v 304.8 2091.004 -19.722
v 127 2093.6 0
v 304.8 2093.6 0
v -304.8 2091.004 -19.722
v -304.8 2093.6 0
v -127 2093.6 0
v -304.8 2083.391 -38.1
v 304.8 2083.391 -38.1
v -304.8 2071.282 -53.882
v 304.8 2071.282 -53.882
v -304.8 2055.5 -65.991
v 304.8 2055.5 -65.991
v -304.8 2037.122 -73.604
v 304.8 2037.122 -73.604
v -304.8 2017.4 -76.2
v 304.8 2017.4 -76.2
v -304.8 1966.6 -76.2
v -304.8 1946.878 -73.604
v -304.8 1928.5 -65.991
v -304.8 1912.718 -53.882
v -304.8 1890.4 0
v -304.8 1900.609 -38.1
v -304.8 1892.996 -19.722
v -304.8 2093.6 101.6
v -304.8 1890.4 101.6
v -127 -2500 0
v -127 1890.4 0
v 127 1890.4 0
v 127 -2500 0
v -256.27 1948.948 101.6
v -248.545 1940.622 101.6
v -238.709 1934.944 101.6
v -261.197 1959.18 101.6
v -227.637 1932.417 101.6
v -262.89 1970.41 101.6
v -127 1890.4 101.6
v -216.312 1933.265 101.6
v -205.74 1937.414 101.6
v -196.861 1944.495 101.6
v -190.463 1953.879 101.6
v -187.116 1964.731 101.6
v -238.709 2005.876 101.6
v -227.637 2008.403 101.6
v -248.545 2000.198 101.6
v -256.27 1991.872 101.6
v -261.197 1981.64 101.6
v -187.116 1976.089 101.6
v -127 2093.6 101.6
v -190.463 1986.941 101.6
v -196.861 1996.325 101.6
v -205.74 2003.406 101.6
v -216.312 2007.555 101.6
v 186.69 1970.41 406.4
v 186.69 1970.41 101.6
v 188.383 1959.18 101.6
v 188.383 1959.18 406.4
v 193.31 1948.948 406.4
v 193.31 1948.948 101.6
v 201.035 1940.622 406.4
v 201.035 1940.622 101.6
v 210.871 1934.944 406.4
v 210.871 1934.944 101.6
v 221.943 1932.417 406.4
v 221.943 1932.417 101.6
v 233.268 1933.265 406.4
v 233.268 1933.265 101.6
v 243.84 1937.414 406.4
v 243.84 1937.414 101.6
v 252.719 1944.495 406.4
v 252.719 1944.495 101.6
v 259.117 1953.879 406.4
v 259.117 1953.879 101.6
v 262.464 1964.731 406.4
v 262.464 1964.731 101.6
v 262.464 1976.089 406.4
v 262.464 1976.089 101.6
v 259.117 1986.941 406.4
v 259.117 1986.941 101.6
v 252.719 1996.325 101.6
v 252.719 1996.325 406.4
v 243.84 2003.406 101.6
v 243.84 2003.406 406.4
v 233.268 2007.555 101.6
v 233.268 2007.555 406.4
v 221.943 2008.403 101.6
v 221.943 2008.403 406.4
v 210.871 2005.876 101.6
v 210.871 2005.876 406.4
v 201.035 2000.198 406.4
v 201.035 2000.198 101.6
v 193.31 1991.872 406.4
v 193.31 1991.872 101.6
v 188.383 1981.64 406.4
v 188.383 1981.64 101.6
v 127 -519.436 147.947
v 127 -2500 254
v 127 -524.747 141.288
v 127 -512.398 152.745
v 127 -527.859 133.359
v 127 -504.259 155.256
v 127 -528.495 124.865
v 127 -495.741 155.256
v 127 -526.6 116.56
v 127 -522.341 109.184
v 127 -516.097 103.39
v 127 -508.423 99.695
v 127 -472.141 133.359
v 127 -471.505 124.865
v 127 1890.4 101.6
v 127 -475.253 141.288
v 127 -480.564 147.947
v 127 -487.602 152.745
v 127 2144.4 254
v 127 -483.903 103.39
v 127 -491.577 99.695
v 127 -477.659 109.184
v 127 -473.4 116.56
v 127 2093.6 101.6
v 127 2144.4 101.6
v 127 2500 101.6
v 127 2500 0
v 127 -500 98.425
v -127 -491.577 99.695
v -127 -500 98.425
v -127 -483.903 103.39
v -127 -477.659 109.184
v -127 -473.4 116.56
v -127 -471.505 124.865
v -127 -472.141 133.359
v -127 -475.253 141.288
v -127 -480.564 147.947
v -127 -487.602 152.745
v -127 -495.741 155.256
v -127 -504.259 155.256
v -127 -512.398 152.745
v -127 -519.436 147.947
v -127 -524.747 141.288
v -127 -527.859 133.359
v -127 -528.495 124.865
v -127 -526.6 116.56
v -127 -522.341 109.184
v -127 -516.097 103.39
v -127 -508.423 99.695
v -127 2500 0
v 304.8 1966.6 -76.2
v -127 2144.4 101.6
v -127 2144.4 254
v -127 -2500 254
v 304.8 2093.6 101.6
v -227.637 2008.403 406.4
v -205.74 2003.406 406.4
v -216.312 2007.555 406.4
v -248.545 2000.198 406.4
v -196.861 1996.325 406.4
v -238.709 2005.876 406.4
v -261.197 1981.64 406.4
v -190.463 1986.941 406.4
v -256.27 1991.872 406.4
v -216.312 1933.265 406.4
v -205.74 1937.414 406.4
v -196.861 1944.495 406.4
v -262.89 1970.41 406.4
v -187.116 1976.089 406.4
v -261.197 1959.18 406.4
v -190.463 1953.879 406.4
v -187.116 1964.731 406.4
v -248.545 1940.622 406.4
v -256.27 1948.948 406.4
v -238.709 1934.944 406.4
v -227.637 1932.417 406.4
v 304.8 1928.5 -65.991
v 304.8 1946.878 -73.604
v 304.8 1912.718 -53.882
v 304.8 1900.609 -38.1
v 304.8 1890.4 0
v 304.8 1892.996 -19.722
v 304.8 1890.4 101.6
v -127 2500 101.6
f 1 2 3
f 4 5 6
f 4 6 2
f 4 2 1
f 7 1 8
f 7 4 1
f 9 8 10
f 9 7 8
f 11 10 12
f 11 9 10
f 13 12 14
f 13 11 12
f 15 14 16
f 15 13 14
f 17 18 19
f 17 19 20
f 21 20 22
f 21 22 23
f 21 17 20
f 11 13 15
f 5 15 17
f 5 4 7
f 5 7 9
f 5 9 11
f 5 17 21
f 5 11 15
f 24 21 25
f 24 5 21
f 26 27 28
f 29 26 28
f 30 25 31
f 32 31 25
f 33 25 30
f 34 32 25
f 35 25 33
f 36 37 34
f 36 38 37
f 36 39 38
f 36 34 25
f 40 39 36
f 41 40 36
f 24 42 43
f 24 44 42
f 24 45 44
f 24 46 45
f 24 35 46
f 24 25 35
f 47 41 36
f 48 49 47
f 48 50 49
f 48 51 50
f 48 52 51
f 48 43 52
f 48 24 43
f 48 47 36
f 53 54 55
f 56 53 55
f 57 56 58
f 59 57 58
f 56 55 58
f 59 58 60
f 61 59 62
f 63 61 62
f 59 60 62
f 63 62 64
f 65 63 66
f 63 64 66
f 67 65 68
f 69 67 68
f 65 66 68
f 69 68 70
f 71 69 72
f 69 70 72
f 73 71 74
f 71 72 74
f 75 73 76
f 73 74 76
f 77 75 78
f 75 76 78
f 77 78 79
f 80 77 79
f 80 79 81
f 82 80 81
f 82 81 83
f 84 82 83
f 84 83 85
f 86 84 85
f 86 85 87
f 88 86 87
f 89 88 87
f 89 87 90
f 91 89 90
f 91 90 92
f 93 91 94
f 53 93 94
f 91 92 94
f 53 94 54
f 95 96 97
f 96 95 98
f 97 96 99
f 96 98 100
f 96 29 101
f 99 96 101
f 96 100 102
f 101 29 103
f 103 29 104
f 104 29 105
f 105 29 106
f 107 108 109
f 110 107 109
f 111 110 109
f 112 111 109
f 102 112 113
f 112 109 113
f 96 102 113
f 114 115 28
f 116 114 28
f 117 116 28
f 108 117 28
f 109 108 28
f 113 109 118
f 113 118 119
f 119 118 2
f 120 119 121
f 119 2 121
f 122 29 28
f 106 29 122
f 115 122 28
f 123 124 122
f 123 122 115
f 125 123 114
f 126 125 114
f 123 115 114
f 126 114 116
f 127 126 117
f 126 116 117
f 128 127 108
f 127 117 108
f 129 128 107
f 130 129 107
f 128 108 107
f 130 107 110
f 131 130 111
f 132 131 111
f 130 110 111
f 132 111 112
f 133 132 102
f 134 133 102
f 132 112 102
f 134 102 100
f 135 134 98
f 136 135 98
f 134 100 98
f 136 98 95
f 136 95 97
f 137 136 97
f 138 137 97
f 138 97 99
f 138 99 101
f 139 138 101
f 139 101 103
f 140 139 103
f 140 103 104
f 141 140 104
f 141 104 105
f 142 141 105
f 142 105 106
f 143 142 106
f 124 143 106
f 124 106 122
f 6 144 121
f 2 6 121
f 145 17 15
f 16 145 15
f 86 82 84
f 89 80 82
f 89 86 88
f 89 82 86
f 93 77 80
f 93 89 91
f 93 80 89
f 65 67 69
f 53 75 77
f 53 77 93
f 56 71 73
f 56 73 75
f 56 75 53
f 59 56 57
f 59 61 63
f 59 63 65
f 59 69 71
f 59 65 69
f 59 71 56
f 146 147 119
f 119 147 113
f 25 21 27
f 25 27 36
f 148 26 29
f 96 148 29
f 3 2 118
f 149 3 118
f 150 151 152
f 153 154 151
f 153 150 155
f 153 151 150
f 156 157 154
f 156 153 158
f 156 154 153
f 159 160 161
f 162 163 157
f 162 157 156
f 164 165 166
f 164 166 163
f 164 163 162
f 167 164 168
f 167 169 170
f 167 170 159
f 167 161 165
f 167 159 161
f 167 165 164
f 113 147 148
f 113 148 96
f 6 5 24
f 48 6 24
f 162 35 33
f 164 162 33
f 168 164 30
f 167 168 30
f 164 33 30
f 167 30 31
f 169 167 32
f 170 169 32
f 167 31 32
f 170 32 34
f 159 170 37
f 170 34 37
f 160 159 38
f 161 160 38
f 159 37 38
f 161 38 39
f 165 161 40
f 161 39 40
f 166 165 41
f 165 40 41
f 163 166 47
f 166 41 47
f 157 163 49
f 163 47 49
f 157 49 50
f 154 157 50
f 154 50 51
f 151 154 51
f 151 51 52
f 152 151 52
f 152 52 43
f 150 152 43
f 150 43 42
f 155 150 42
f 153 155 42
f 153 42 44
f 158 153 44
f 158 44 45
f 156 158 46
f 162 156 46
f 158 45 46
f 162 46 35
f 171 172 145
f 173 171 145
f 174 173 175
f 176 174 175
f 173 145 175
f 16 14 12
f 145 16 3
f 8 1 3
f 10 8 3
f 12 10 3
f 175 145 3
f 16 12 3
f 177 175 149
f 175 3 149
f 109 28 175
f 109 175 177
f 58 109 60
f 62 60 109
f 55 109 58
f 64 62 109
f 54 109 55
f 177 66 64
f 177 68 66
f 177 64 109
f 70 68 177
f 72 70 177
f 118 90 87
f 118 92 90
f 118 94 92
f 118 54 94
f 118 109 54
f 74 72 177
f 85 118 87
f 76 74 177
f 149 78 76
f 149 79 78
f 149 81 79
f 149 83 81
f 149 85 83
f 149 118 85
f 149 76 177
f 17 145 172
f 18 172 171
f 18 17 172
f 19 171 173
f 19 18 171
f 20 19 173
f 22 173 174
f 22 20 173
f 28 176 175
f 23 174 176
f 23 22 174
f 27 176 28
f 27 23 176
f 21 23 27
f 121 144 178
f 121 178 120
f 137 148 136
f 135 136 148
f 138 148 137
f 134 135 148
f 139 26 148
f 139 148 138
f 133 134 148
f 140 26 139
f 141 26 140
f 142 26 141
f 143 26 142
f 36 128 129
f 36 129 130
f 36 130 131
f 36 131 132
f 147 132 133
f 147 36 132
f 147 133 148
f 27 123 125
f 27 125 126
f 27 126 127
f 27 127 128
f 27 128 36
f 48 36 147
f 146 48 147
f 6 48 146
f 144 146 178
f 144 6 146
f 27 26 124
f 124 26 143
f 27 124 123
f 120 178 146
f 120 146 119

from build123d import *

# Parameters (mm, degrees)
SKETCH1_W           = 254
SKETCH1_H           = 5000
BOSS_EXTRUDE1_DEPTH = 254
SKETCH2_R           = 28.575
CUT_EXTRUDE1_DEPTH  = 2526.674563359
SKETCH4_W           = 254
SKETCH4_H           = 355.6
CUT_EXTRUDE2_DEPTH  = 152.4
BOSS_EXTRUDE2_START = -152.4
SKETCH5_W           = 609.6
SKETCH5_H           = 203.2
BOSS_EXTRUDE2_DEPTH = 101.6
SKETCH8_W           = 76.2
SKETCH8_H           = 203.2
BOSS_EXTRUDE3_DEPTH = 609.6
FILLET1_START       = -304.8
FILLET1_DEPTH       = 609.6
SKETCH9_R           = 38.1
BOSS_EXTRUDE4_DEPTH = 304.8


with BuildPart() as part:
    # Sketch1 → Boss-Extrude1 (new body)
    with BuildSketch(Plane.XY):
        Rectangle(SKETCH1_W, SKETCH1_H)
    extrude(amount=BOSS_EXTRUDE1_DEPTH)

    # Sketch2 → Cut-Extrude1 (cut, through all)
    with BuildSketch(Plane(origin=(127, 0, 0), x_dir=(0, 0, -1), z_dir=(1, 0, 0))):
        with Locations((-127, -500)):
            Circle(SKETCH2_R)
    extrude(amount=-CUT_EXTRUDE1_DEPTH, mode=Mode.SUBTRACT)

    # Sketch4 → Cut-Extrude2 (cut)
    with BuildSketch(Plane.XY.offset(254)):
        with Locations((0, 2322.2)):
            Rectangle(SKETCH4_W, SKETCH4_H)
    extrude(amount=-CUT_EXTRUDE2_DEPTH, mode=Mode.SUBTRACT)

    # Sketch5 → Boss-Extrude2 (add)
    with BuildSketch(Plane.XY.offset(254).offset(BOSS_EXTRUDE2_START)):
        with Locations((0, 1992)):
            Rectangle(SKETCH5_W, SKETCH5_H)
    extrude(amount=-BOSS_EXTRUDE2_DEPTH)

    # Sketch8 → Boss-Extrude3 (add)
    with BuildSketch(Plane.ZY.offset(304.8)):
        with Locations((-38.1, 1992)):
            Rectangle(SKETCH8_W, SKETCH8_H)
    extrude(amount=-BOSS_EXTRUDE3_DEPTH)

    # Fillet1: read off the stored shape, not the designer's step
    # Fillet1 outline → Fillet1 (cut)
    with BuildSketch(Plane.YZ.offset(FILLET1_START)):
        with BuildLine():
            Line((1890.4, -76.2), (1966.6, -76.2))
            ThreePointArc((1966.6, -76.2), (1912.718463274, -53.881536726), (1890.4, 0))
            Line((1890.4, 0), (1890.4, -76.2))
        make_face()
        with BuildLine():
            ThreePointArc((2093.6, 0), (2071.281536726, -53.881536726), (2017.4, -76.2))
            Line((2017.4, -76.2), (2093.6, -76.2))
            Line((2093.6, -76.2), (2093.6, 0))
        make_face()
    extrude(amount=FILLET1_DEPTH, mode=Mode.SUBTRACT)

    # Sketch9 → Boss-Extrude4 (add)
    with BuildSketch(Plane.XY.offset(101.6)):
        with Locations(Location((-224.79, 1970.41, 0), (0, 0, 180))):
            Circle(SKETCH9_R)
        with Locations(Location((224.79, 1970.41, 0), (0, 0, 180))):
            Circle(SKETCH9_R)
    extrude(amount=BOSS_EXTRUDE4_DEPTH)


solid = part.part
